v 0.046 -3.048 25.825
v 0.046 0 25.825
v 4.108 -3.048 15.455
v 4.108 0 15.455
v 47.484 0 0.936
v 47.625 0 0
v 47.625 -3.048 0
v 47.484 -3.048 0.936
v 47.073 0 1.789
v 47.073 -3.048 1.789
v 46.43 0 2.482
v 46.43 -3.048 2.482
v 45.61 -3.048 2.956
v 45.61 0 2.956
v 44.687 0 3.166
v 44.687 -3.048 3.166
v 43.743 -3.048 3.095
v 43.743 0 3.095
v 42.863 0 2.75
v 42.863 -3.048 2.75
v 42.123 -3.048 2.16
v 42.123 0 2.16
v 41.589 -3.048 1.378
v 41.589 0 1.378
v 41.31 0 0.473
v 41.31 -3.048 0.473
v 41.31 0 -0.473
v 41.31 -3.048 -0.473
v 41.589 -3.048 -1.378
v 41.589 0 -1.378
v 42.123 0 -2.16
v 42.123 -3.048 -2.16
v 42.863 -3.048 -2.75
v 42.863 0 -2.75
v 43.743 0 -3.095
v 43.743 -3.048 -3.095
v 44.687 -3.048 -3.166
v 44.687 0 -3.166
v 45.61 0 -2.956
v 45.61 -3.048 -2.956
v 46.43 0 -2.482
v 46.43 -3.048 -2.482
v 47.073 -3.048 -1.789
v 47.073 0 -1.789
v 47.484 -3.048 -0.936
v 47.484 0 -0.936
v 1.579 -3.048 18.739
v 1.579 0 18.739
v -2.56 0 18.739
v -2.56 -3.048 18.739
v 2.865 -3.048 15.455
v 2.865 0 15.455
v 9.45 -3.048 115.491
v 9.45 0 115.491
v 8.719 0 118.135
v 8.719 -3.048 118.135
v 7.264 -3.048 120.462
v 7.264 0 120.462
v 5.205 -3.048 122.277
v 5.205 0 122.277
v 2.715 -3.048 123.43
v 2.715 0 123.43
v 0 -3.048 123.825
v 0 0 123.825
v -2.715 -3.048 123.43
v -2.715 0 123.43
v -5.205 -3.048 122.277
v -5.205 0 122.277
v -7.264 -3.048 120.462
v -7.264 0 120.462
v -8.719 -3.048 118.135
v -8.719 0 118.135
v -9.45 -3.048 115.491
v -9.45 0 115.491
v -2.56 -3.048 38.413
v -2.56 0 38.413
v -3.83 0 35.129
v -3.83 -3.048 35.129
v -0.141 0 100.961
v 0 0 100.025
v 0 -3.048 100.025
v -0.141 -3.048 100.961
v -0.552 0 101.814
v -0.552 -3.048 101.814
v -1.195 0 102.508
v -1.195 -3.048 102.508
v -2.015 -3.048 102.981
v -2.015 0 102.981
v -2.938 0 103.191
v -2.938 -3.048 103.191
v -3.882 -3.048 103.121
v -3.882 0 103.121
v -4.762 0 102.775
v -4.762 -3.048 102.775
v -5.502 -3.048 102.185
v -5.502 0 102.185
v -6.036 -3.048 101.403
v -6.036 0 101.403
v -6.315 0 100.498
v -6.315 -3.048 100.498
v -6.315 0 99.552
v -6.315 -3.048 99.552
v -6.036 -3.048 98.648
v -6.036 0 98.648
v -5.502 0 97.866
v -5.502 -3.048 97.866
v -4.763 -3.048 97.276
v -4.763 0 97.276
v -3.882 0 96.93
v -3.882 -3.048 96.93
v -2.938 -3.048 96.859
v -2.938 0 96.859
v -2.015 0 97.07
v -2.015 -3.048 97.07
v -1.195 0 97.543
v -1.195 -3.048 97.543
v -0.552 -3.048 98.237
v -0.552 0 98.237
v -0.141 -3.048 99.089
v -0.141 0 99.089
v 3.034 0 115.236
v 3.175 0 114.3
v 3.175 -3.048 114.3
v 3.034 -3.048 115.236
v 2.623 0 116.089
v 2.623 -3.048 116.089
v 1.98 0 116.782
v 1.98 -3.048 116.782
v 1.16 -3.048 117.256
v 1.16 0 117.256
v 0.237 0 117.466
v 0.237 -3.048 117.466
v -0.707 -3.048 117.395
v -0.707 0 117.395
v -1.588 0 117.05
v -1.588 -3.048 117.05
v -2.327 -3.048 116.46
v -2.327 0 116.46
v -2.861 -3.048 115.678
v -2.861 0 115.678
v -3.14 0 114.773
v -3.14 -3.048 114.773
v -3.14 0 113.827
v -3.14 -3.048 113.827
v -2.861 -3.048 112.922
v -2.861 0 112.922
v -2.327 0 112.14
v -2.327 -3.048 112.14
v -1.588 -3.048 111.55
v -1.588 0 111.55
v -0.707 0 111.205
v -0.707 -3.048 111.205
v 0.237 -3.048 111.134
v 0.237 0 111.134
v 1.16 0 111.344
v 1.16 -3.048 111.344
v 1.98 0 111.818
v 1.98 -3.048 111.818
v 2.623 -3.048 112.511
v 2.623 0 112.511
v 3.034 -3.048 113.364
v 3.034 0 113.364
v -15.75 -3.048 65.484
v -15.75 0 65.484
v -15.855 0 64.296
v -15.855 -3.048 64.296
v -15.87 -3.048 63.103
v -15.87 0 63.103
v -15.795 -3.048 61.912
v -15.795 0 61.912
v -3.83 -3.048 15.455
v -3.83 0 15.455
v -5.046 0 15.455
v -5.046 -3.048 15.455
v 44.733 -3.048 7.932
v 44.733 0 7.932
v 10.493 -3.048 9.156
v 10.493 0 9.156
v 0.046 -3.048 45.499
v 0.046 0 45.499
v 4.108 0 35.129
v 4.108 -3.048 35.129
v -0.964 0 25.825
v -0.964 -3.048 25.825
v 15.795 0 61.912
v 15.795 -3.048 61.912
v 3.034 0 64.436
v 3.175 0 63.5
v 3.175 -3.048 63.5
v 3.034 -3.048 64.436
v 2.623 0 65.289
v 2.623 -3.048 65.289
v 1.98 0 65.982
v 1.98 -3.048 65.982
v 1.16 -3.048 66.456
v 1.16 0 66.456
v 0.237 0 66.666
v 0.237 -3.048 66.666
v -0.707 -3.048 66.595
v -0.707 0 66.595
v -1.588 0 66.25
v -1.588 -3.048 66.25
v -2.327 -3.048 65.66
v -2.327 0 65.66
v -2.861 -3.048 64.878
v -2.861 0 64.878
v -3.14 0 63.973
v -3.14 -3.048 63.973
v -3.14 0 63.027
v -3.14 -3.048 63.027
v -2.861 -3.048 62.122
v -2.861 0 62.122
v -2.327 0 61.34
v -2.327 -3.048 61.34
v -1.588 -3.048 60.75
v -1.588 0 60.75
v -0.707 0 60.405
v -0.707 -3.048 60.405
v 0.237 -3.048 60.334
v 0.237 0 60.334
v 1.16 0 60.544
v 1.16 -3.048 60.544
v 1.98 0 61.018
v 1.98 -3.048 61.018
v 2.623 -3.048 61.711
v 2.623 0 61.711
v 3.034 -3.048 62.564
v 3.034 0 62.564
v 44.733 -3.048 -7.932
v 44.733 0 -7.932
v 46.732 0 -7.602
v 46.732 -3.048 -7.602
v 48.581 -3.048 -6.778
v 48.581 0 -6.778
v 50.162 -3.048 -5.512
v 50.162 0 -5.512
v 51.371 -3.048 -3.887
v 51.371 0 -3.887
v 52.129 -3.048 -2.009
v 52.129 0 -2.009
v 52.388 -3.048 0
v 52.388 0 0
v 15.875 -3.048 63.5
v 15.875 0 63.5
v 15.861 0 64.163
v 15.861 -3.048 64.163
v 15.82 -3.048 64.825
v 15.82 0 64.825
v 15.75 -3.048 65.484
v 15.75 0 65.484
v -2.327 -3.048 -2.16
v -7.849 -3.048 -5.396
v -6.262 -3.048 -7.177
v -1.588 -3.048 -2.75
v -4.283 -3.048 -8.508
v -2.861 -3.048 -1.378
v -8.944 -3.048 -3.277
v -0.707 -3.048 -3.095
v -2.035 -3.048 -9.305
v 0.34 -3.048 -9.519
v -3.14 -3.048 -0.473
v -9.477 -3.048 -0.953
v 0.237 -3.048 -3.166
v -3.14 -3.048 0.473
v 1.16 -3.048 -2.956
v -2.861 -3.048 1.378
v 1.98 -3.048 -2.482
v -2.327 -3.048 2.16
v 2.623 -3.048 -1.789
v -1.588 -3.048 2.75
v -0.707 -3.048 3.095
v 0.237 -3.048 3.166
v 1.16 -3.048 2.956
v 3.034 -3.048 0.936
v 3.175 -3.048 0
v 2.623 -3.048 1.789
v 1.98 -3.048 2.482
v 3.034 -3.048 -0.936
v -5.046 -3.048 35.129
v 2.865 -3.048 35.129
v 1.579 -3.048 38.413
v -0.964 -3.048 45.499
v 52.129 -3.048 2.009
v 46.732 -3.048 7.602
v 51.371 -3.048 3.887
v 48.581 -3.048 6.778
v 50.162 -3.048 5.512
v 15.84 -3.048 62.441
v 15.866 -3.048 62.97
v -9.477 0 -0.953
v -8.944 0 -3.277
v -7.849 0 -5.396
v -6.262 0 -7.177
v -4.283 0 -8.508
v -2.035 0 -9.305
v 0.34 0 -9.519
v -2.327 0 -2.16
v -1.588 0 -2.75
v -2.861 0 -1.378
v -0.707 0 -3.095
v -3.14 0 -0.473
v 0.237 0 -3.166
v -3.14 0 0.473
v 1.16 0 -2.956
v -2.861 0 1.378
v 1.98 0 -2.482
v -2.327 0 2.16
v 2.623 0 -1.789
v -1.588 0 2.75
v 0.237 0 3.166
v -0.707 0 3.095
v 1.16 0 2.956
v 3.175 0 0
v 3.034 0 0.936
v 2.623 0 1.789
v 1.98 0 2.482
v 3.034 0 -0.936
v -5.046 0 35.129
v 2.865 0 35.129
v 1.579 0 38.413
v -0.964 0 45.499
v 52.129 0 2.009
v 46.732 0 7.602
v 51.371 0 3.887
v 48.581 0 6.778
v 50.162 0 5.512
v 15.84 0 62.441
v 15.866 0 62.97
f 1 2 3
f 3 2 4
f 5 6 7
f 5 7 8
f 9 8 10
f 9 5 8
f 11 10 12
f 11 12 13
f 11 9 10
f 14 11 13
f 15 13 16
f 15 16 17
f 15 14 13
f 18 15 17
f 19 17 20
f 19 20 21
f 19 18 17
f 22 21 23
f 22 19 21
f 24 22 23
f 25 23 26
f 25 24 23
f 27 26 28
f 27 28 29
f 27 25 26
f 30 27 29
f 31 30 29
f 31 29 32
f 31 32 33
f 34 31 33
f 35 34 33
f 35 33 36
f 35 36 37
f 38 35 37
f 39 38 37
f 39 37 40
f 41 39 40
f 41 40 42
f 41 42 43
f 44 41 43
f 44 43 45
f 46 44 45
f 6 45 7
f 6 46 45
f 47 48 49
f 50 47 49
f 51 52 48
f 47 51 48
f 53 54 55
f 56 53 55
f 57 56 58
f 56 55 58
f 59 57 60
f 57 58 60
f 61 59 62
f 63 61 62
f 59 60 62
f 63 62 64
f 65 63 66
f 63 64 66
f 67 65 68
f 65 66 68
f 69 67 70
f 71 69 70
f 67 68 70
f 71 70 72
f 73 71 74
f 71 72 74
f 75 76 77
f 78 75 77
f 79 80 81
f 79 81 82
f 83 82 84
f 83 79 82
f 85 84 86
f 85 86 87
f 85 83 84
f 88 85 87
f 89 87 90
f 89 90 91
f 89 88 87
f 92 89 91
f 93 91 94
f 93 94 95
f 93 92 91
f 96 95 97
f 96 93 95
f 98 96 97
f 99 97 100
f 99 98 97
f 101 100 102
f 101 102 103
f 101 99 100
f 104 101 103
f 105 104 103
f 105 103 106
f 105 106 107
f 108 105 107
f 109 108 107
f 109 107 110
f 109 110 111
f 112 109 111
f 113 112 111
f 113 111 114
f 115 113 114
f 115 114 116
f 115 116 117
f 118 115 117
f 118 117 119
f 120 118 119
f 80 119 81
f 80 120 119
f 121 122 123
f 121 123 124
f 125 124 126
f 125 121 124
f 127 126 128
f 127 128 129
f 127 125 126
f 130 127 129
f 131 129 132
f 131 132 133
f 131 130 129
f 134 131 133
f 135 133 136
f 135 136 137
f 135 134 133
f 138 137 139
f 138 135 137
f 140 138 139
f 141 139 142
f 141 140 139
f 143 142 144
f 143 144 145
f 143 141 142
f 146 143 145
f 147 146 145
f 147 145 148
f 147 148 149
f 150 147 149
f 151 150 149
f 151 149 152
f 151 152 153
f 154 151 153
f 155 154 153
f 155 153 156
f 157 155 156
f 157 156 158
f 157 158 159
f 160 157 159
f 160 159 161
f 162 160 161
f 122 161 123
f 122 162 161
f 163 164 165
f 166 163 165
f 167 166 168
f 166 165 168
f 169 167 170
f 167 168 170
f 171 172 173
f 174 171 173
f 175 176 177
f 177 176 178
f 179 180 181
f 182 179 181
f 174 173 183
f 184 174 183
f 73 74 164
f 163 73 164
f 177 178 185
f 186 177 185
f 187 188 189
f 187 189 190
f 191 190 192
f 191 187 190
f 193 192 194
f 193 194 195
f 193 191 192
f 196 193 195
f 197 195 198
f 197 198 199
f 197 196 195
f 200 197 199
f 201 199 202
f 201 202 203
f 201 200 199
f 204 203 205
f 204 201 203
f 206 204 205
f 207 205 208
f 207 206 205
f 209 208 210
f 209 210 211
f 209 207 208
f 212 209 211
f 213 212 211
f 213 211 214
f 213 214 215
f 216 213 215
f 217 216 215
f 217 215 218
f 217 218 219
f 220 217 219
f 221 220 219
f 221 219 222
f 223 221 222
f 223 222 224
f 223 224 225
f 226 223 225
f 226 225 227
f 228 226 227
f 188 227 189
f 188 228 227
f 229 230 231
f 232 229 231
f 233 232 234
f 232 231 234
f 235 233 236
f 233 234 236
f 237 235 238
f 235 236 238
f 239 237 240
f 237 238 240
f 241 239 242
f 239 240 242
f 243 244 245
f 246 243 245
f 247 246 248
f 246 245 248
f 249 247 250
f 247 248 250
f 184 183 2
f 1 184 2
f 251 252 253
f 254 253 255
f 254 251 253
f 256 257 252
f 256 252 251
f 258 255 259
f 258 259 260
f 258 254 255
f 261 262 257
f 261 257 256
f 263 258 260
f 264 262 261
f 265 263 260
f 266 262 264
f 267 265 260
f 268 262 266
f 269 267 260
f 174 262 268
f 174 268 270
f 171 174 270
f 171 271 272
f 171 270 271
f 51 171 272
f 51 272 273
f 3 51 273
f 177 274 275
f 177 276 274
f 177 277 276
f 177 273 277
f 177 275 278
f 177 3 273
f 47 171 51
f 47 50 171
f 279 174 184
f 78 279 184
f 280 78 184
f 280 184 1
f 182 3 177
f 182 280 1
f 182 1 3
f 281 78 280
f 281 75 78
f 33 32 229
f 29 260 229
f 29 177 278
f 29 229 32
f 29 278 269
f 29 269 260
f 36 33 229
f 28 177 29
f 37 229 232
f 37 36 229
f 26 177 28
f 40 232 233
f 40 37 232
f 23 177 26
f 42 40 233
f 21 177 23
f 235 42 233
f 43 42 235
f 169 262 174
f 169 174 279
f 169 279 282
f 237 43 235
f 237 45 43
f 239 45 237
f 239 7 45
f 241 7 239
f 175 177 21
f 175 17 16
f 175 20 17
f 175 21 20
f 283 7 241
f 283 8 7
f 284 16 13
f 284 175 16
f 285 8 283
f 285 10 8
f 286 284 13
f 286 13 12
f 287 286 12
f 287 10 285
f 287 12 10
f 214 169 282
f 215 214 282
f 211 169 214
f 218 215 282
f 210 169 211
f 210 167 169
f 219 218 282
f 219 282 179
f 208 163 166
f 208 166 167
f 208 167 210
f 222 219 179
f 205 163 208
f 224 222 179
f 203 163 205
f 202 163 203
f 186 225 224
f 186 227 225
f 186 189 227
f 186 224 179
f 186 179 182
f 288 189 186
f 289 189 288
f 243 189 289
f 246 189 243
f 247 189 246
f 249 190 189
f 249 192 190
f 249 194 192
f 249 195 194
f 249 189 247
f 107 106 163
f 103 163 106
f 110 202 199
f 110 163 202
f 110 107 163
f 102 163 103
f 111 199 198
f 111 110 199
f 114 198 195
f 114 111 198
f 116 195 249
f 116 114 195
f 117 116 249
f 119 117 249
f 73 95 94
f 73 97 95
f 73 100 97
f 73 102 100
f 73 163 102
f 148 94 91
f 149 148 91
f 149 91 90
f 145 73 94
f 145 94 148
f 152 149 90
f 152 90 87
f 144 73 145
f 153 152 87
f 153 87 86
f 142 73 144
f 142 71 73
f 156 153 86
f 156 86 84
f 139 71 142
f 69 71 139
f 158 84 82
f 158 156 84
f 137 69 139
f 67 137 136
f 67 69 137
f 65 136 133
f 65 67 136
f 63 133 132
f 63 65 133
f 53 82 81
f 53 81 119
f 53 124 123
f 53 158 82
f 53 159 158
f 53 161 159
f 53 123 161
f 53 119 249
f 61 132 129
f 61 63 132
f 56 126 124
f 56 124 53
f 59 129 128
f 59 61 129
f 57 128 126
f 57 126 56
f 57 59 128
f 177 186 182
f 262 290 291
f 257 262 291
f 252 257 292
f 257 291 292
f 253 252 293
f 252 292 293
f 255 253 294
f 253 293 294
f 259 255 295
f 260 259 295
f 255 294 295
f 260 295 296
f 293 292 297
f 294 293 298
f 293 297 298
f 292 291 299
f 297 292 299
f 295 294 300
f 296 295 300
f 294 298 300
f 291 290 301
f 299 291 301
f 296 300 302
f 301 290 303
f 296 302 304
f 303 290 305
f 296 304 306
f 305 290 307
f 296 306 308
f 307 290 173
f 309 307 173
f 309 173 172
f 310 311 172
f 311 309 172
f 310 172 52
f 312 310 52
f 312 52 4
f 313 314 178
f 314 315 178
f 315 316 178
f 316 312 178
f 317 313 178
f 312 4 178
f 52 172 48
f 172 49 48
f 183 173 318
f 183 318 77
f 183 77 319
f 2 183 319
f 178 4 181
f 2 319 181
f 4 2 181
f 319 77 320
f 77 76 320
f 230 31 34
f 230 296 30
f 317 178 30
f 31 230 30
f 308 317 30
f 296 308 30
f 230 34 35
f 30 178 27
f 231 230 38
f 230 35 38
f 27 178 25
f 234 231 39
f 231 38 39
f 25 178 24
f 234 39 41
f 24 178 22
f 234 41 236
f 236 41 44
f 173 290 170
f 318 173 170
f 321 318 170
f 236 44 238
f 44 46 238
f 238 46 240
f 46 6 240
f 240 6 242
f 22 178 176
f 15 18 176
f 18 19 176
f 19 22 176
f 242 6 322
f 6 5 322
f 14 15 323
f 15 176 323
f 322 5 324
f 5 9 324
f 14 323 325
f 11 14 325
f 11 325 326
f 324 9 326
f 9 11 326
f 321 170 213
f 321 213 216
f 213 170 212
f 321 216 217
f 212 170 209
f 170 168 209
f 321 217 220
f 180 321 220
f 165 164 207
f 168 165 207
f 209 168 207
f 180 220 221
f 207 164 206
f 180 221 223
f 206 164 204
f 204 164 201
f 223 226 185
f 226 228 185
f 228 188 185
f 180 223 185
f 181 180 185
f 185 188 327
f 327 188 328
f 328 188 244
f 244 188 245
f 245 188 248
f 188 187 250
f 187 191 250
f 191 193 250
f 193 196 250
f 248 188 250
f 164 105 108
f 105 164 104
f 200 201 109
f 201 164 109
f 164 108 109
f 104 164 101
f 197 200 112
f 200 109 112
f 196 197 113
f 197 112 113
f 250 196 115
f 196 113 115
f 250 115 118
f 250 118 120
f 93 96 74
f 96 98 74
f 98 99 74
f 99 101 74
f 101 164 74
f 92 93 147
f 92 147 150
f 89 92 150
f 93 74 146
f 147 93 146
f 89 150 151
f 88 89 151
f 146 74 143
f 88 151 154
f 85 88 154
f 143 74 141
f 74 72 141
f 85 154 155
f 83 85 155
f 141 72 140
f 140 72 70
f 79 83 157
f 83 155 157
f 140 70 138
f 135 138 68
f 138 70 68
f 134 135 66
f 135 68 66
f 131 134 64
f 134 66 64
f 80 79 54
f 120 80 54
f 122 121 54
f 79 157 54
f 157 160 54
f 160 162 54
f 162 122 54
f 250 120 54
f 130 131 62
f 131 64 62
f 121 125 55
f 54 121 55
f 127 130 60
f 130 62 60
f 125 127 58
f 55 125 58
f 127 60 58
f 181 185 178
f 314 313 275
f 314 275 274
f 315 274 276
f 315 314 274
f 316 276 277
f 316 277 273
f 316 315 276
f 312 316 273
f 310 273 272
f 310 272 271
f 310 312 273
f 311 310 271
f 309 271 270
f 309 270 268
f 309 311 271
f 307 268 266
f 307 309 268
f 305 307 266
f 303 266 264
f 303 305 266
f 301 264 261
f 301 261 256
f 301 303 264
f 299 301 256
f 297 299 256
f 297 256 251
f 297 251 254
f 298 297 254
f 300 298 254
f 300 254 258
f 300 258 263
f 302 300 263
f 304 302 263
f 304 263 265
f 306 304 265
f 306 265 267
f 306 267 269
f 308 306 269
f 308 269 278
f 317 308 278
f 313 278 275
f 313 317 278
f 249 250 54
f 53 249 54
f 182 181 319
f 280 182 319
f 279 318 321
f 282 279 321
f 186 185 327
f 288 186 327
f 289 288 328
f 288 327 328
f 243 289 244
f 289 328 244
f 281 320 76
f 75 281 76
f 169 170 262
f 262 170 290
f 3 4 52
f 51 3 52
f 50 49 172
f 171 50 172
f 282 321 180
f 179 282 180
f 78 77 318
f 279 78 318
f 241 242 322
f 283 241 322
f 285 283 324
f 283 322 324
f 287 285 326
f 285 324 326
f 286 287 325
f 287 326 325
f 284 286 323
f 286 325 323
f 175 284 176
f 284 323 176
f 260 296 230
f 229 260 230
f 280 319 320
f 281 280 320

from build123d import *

# Parameters (mm, degrees)
F0_R     = 3.175
F1_DEPTH = 3.048


with BuildPart() as f1:
    # F0 (on Front) → F1 (new body)
    with BuildSketch(Plane.XZ):
        with BuildLine():
            ThreePointArc((9.4772553384, -0.9525), (9.5130563464, -0.4768479324), (9.525, 0))
            ThreePointArc((9.525, 0), (6.8544082857, 6.6138273378), (0.3401785714, 9.5189234444))
            ThreePointArc((0.3401785714, 9.5189234444), (-6.948684782, 6.5147068085), (-9.4772553384, -0.9525))
            ThreePointArc((-9.4772553384, -0.9525), (-6.2623833552, -7.1769199322), (0.3401786416, -9.5189234418))
            ThreePointArc((0.3401786416, -9.5189234418), (6.5147068341, -6.948684758), (9.4772553384, -0.9525))
        make_face()
        Circle(F0_R, mode=Mode.SUBTRACT)
        with BuildLine():
            ThreePointArc((0.3401785714, 9.5189234444), (6.8544082857, 6.6138273378), (9.525, 0))
            ThreePointArc((9.525, 0), (9.5130563464, -0.4768479324), (9.4772553384, -0.9525))
            Line((9.4772553384, -0.9525), (10.4932062399, 9.1560838367))
            Line((10.4932062399, 9.1560838367), (0.3401785714, 9.5189234444))
        make_face()
        with BuildLine():
            ThreePointArc((-9.4772553384, -0.9525), (-6.948684782, 6.5147068085), (0.3401785714, 9.5189234444))
            Line((0.3401785714, 9.5189234444), (10.4932062399, 9.1560838367))
            Line((10.4932062399, 9.1560838367), (15.7954255641, 61.9125))
            ThreePointArc((15.7954255641, 61.9125), (0, 47.625), (-15.7954255641, 61.9125))
            Line((-15.7954255641, 61.9125), (-9.4772553384, -0.9525))
        make_face()
        Polygon((4.1081828244, 15.4546830389), (2.8649913232, 15.4546830389), (1.5788532065, 18.7389689503), (-2.5598443184, 18.7389689503), (-3.8301599978, 15.4546830389), (-5.0462273207, 15.4546830389), (-0.9640385005, 25.825160507), (0.0463371378, 25.825160507), align=None, mode=Mode.SUBTRACT)
        Polygon((4.1081828244, 35.1287536323), (2.8649913232, 35.1287536323), (1.5788532065, 38.4130395436), (-2.5598443184, 38.4130395436), (-3.8301599978, 35.1287536323), (-5.0462273207, 35.1287536323), (-0.9640385005, 45.4992311004), (0.0463371378, 45.4992311004), align=None, mode=Mode.SUBTRACT)
        with BuildLine():
            Line((10.4932062399, 9.1560838367), (9.4772553384, -0.9525))
            ThreePointArc((9.4772553384, -0.9525), (6.5147068341, -6.948684758), (0.3401786416, -9.5189234418))
            Line((0.3401786416, -9.5189234418), (44.7334821429, -7.9324362036))
            ThreePointArc((44.7334821429, -7.9324362036), (36.5125, 0), (44.7334821429, 7.9324362036))
            Line((44.7334821429, 7.9324362036), (10.4932062399, 9.1560838367))
        make_face()
        with BuildLine():
            ThreePointArc((-15.7504882737, 65.484375), (-15.8737438155, 63.6997054867), (-15.7954255641, 61.9125))
            ThreePointArc((-15.7954255641, 61.9125), (0, 47.625), (15.7954255641, 61.9125))
            ThreePointArc((15.7954255641, 61.9125), (15.8550939106, 62.7052534459), (15.875, 63.5))
            ThreePointArc((15.875, 63.5), (15.8438414904, 64.4941387366), (15.7504882737, 65.484375))
            ThreePointArc((15.7504882737, 65.484375), (0, 79.375), (-15.7504882737, 65.484375))
        make_face()
        with Locations((0, 63.5)):
            Circle(F0_R, mode=Mode.SUBTRACT)
        with BuildLine():
            ThreePointArc((52.3875, 0), (50.1620069047, 5.5115227815), (44.7334821429, 7.9324362036))
            ThreePointArc((44.7334821429, 7.9324362036), (36.5125, 0), (44.7334821429, -7.9324362036))
            ThreePointArc((44.7334821429, -7.9324362036), (50.1620069047, -5.5115227815), (52.3875, 0))
        make_face()
        with Locations((44.45, 0)):
            Circle(F0_R, mode=Mode.SUBTRACT)
        with BuildLine():
            Line((-9.4502929642, 115.490625), (-15.7504882737, 65.484375))
            ThreePointArc((-15.7504882737, 65.484375), (0, 79.375), (15.7504882737, 65.484375))
            Line((15.7504882737, 65.484375), (9.4502929642, 115.490625))
            ThreePointArc((9.4502929642, 115.490625), (9.5063048942, 114.896483242), (9.525, 114.3))
            ThreePointArc((9.525, 114.3), (-0.596483242, 104.7936951058), (-9.4502929642, 115.490625))
        make_face()
        with Locations((-3.175, 100.0252)):
            Circle(F0_R, mode=Mode.SUBTRACT)
        with BuildLine():
            ThreePointArc((9.4502929642, 115.490625), (0, 123.825), (-9.4502929642, 115.490625))
            ThreePointArc((-9.4502929642, 115.490625), (-0.596483242, 104.7936951058), (9.525, 114.3))
            ThreePointArc((9.525, 114.3), (9.5063048942, 114.896483242), (9.4502929642, 115.490625))
        make_face()
        with Locations((0, 114.3)):
            Circle(F0_R, mode=Mode.SUBTRACT)
    extrude(amount=F1_DEPTH)


solid = f1.part
